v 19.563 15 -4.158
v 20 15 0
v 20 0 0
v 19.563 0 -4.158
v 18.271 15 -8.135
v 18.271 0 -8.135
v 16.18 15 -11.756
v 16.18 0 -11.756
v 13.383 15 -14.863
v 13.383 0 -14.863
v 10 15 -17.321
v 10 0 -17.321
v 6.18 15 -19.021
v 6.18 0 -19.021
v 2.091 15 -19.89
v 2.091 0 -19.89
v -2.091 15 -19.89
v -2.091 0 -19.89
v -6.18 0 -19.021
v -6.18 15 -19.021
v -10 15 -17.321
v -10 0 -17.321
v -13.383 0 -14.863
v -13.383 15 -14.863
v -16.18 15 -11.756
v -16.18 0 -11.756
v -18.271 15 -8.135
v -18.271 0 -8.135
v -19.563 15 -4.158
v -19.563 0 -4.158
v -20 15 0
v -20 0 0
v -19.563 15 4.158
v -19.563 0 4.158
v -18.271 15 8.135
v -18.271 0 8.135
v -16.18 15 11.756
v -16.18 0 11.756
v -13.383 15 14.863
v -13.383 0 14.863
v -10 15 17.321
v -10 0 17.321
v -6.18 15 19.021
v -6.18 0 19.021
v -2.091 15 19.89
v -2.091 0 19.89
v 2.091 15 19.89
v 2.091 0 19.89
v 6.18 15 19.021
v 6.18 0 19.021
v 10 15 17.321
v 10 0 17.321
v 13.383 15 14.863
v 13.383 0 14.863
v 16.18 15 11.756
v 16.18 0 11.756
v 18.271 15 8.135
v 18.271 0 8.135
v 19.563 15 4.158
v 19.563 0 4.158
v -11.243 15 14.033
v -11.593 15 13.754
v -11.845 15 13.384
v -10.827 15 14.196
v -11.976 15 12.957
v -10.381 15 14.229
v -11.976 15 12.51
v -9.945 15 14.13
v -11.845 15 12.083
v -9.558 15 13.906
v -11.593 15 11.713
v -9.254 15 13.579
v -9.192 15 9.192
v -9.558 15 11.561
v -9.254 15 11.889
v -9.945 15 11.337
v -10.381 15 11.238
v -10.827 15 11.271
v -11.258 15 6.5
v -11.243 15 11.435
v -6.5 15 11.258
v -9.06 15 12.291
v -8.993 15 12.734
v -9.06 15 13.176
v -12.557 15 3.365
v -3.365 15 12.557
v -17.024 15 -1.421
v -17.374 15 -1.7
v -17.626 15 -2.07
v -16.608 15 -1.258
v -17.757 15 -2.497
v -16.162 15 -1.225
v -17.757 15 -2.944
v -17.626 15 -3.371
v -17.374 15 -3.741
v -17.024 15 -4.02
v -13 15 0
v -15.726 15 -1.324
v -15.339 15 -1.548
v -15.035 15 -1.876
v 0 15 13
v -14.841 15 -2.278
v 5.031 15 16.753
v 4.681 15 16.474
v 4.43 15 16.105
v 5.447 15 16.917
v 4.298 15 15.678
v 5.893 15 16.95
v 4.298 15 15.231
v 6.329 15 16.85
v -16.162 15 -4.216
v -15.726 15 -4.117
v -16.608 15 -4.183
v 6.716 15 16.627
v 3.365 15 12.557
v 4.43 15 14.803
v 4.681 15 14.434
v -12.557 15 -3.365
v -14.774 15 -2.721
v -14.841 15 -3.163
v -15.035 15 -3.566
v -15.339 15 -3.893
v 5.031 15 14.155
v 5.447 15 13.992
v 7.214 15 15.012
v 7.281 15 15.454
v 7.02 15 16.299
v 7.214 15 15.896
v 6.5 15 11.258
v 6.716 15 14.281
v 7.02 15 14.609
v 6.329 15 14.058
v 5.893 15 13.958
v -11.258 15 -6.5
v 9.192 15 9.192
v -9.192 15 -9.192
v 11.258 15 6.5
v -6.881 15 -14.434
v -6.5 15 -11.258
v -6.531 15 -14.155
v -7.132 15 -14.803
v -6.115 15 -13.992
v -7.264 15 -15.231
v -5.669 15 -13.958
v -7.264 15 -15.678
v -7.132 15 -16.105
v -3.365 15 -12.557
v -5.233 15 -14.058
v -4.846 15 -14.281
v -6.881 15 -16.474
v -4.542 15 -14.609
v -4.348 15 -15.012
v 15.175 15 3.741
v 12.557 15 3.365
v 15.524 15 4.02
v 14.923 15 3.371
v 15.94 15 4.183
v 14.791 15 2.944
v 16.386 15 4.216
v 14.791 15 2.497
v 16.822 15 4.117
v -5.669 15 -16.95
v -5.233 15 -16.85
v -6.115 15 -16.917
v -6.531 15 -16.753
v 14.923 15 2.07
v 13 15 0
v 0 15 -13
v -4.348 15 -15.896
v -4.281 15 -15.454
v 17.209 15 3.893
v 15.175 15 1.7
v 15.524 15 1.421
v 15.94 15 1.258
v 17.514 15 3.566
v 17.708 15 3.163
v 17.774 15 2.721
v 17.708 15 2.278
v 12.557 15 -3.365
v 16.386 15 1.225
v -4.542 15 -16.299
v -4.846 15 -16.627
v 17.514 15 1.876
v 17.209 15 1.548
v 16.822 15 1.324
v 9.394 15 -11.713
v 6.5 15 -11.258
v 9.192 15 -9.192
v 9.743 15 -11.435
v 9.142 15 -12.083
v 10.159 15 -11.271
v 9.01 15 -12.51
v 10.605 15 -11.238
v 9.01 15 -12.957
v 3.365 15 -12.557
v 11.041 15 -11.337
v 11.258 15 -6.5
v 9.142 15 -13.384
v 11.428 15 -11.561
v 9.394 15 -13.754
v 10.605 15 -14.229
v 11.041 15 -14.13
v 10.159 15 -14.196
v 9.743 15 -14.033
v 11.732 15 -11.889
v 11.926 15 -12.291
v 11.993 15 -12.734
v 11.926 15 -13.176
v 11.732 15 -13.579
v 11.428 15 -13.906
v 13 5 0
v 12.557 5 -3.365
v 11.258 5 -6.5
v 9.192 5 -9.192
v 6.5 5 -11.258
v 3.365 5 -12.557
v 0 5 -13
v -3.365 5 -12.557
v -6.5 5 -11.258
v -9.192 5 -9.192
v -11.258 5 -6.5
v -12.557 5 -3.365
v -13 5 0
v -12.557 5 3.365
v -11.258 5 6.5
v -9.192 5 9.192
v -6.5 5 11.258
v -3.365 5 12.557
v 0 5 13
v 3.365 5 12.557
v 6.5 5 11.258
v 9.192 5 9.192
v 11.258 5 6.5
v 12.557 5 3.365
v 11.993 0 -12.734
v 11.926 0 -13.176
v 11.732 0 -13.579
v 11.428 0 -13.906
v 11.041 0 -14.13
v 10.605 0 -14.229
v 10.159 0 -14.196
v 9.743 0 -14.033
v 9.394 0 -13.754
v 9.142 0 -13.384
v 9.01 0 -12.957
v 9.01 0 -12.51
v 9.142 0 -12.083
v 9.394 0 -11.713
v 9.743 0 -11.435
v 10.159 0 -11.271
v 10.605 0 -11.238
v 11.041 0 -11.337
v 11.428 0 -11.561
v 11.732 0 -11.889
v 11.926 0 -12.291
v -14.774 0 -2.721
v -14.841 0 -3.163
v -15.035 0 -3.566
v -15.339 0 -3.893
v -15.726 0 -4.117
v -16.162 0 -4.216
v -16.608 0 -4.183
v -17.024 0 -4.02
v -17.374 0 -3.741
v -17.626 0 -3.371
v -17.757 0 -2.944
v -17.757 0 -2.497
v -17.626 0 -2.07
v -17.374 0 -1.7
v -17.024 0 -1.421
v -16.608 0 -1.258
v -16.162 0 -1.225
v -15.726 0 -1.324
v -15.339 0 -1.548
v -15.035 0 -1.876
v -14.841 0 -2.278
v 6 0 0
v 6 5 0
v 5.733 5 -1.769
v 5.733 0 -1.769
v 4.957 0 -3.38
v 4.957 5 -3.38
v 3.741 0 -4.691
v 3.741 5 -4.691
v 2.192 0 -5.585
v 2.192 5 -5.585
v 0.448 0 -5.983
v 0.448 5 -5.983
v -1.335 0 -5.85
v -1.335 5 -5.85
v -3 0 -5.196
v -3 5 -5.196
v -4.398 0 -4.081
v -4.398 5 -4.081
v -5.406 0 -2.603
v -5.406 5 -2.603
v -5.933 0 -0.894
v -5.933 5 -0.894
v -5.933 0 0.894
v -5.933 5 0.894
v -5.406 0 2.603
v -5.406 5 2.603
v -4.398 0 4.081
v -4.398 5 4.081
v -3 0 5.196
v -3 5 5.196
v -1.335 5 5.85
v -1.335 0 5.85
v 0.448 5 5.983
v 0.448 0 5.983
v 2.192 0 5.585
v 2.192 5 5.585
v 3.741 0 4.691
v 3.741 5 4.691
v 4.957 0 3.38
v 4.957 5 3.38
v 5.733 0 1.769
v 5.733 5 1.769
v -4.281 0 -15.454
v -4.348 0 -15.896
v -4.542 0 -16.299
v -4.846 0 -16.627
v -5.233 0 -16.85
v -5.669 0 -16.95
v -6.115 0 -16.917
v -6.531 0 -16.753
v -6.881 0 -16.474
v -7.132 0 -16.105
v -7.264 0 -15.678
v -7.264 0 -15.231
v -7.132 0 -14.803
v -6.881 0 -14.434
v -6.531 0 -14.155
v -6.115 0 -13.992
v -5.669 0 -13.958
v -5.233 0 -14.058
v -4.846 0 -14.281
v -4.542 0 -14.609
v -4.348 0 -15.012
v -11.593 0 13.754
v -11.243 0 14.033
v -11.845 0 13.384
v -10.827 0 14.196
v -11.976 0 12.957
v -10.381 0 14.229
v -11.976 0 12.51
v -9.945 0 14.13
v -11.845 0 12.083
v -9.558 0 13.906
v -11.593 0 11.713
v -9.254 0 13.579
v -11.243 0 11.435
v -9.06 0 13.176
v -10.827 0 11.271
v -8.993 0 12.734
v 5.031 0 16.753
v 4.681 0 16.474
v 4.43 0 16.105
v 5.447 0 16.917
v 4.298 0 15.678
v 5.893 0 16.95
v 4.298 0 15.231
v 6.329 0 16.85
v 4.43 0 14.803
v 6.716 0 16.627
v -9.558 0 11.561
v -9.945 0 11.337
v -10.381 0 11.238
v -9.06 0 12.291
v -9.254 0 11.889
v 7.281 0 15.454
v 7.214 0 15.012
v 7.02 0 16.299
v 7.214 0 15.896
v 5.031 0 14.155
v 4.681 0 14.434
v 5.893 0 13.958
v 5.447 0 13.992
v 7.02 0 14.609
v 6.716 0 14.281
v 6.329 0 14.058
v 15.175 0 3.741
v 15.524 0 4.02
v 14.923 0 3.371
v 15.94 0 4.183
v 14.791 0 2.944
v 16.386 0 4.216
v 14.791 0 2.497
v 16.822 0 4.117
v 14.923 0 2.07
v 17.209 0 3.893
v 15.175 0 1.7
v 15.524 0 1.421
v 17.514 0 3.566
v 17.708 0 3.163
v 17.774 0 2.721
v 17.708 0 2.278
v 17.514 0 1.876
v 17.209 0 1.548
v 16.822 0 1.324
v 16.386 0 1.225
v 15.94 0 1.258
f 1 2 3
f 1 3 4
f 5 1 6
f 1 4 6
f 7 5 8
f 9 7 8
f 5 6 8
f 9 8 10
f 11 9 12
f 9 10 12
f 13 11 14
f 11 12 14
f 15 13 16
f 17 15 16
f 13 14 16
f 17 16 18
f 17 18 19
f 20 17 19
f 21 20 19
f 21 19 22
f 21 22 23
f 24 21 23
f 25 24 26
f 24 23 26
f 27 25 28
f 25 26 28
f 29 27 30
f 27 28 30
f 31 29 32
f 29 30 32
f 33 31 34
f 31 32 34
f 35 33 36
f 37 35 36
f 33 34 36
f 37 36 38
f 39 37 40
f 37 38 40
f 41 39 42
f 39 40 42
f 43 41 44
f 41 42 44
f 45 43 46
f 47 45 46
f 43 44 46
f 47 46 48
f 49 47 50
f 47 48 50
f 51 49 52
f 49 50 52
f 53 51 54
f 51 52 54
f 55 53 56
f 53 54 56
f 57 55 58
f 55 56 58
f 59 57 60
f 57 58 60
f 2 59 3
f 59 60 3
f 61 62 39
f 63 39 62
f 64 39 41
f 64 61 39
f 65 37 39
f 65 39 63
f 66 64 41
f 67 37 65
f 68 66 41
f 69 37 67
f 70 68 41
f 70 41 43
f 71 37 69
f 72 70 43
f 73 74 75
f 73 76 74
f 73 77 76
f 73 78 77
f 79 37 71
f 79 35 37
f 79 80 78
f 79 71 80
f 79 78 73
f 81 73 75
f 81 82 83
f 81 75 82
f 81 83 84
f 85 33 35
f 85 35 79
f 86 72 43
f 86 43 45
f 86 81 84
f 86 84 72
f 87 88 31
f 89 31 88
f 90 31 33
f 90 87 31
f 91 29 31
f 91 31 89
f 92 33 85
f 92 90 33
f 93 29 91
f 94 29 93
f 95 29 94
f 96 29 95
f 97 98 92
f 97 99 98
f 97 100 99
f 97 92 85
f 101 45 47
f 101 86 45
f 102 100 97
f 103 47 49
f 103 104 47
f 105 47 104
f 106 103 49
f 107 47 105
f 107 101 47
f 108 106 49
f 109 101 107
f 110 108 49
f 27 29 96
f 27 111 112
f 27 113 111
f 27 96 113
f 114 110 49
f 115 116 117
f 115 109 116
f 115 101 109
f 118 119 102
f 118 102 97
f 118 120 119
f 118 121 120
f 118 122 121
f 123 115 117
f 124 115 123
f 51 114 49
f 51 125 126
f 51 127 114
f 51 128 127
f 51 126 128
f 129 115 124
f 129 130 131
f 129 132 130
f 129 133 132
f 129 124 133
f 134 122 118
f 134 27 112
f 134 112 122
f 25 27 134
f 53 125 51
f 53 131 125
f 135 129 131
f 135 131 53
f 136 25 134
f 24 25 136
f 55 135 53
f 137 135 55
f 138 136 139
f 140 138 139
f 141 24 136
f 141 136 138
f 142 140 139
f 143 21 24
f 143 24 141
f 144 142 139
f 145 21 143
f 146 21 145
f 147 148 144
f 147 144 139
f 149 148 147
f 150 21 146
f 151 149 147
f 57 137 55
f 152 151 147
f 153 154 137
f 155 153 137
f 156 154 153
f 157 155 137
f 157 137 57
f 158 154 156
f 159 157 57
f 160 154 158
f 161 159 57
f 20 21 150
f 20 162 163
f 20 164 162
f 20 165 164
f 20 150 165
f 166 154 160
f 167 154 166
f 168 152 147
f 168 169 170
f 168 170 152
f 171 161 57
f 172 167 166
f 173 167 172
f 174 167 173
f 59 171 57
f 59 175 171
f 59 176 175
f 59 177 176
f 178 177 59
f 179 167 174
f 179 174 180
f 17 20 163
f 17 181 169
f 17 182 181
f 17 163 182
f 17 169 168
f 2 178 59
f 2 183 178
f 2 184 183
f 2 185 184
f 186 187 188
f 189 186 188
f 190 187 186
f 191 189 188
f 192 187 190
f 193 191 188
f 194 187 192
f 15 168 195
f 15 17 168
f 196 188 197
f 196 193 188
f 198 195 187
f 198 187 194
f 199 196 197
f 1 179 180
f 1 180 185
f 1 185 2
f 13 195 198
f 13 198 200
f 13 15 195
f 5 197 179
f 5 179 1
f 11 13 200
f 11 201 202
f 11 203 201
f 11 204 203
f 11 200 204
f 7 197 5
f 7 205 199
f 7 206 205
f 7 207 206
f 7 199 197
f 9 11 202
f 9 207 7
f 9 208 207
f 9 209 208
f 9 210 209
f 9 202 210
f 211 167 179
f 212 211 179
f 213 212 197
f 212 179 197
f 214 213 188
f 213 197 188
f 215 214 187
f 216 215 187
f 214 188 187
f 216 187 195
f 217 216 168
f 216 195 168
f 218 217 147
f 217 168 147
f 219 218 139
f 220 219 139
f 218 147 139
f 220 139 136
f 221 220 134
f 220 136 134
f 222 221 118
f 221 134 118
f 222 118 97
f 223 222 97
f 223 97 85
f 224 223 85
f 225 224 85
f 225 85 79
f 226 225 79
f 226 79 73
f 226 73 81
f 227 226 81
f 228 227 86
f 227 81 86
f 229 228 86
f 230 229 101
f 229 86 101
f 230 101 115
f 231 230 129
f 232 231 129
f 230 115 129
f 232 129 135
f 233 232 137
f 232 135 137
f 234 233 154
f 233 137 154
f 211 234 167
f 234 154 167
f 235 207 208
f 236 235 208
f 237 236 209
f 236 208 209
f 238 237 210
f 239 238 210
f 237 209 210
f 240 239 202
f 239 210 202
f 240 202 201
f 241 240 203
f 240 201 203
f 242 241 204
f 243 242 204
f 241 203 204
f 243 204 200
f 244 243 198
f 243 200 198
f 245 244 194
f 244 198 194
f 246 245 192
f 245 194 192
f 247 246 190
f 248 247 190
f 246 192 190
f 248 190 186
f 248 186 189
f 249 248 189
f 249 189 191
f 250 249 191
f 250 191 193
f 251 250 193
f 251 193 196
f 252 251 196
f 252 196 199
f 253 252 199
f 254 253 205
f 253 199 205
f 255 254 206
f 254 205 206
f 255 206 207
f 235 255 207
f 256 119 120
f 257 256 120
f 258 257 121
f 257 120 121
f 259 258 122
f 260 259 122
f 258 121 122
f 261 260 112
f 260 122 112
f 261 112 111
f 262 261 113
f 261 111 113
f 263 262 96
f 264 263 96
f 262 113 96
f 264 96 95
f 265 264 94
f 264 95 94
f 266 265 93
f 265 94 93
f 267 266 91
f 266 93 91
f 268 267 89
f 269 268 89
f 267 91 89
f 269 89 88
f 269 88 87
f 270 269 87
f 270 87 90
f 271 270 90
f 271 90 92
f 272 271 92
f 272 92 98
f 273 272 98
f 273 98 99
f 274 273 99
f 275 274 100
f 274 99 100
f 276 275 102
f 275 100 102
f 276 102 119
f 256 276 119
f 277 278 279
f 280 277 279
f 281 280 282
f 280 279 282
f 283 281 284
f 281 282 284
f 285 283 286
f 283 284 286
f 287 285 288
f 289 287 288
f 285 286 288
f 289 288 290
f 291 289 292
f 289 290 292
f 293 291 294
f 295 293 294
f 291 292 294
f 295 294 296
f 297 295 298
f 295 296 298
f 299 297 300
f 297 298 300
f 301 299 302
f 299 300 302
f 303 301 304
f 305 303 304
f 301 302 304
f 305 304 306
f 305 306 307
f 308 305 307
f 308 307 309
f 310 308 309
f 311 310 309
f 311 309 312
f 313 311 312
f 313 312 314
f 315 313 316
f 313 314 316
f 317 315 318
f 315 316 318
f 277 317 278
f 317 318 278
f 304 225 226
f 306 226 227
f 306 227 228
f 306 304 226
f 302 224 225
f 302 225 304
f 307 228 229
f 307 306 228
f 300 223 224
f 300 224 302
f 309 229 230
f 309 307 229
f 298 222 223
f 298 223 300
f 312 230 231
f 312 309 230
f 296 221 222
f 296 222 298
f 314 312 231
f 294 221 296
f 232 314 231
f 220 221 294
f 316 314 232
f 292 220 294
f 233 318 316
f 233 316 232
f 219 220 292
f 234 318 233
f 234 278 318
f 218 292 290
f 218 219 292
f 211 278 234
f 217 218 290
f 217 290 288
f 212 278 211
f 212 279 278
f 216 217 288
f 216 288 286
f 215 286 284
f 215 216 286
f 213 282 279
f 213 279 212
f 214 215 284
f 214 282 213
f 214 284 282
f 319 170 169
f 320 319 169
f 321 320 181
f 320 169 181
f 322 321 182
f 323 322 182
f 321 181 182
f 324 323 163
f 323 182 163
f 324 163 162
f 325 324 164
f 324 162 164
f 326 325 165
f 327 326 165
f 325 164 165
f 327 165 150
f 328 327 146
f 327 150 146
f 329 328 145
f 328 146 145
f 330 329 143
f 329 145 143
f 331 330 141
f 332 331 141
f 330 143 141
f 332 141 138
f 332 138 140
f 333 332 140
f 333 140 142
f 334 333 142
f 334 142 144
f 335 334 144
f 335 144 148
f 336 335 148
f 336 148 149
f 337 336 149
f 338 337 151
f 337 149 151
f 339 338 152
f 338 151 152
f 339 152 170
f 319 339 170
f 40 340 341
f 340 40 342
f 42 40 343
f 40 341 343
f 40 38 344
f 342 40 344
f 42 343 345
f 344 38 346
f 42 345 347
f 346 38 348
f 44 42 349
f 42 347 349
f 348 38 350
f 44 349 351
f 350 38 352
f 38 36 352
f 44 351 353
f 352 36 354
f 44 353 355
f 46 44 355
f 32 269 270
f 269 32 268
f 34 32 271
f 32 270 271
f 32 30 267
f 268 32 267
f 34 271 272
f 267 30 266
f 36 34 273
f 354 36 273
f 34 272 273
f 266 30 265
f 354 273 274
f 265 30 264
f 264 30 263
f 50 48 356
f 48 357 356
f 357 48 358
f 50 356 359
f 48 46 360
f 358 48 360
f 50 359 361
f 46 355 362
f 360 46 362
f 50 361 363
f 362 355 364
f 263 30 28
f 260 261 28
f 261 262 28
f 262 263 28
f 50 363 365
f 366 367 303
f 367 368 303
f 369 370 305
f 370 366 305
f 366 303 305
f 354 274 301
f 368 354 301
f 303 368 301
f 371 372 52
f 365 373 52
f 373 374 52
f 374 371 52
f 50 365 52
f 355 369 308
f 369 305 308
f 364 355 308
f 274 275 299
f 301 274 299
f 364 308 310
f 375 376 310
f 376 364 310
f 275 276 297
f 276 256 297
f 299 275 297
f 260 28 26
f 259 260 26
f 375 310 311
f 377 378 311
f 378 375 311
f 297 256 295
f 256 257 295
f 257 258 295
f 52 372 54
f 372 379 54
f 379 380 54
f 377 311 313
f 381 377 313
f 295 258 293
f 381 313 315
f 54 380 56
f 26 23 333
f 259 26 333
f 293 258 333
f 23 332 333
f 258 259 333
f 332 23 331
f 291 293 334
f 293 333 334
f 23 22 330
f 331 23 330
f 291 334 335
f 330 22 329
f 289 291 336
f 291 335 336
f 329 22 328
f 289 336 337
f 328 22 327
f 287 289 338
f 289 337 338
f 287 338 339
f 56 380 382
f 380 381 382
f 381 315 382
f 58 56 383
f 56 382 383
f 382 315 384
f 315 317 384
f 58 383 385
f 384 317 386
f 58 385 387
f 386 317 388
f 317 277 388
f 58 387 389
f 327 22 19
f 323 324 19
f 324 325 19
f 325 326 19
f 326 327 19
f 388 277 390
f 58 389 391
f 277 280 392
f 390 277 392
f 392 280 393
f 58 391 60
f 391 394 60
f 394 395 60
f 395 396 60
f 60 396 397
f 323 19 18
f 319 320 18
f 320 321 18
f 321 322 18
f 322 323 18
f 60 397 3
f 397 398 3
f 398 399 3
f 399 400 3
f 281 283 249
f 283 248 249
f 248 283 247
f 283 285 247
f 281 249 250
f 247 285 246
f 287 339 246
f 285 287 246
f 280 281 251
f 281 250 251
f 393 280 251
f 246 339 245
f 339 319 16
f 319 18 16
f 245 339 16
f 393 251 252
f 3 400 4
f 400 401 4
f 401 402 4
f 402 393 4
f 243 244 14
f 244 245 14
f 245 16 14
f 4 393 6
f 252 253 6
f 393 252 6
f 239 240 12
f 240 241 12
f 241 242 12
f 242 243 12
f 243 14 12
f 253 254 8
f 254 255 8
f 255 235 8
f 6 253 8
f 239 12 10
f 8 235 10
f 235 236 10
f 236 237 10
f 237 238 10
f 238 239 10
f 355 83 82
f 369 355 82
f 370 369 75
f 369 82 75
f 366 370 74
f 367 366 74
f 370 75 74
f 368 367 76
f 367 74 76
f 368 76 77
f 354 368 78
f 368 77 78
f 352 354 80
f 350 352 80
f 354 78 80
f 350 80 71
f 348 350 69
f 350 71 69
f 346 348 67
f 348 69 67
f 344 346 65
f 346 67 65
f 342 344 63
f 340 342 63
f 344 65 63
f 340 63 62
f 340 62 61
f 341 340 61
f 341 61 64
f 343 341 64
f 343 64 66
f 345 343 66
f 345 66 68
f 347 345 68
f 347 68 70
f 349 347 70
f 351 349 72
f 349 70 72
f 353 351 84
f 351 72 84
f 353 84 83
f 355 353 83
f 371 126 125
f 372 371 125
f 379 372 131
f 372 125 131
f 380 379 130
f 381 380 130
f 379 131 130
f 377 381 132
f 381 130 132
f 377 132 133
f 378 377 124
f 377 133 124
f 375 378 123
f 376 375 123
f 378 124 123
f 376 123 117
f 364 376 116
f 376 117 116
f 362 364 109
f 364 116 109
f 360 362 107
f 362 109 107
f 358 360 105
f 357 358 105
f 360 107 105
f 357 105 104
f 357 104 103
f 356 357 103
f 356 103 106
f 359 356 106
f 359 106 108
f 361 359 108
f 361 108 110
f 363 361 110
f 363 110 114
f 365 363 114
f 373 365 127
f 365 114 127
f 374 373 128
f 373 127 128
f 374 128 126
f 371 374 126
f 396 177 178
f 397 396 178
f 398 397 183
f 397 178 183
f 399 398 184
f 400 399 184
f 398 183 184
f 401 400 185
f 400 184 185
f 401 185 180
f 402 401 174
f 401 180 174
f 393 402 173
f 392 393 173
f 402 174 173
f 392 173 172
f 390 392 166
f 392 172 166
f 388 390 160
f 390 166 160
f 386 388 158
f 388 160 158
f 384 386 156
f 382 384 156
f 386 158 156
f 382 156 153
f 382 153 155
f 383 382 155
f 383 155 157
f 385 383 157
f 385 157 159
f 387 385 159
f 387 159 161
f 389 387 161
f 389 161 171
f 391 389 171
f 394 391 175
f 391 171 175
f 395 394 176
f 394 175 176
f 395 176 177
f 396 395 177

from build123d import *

# Parameters (mm, degrees)
SKETCH1_R           = 20
BOSS_EXTRUDE1_DEPTH = 15
SKETCH2_R           = 13
CUT_EXTRUDE1_DEPTH  = 10
SKETCH3_R           = 6
CUT_EXTRUDE2_DEPTH  = 5
SKETCH4_R           = 1.5
CUT_EXTRUDE3_DEPTH  = 15


with BuildPart() as part:
    # Sketch1 → Boss-Extrude1 (new body)
    with BuildSketch(Plane(origin=(0, 0, 0), x_dir=(1, 0, 0), z_dir=(0, 1, 0))):
        Circle(SKETCH1_R)
    extrude(amount=BOSS_EXTRUDE1_DEPTH)

    # Sketch2 → Cut-Extrude1 (cut)
    with BuildSketch(Plane(origin=(0, 15, 0), x_dir=(1, 0, 0), z_dir=(0, 1, 0))):
        Circle(SKETCH2_R)
    extrude(amount=-CUT_EXTRUDE1_DEPTH, mode=Mode.SUBTRACT)

    # Sketch3 → Cut-Extrude2 (cut)
    with BuildSketch(Plane(origin=(0, 5, 0), x_dir=(1, 0, 0), z_dir=(0, 1, 0))):
        Circle(SKETCH3_R)
    extrude(amount=-CUT_EXTRUDE2_DEPTH, mode=Mode.SUBTRACT)

    # Sketch4 → Cut-Extrude3 (cut)
    with BuildSketch(Plane(origin=(0, 15, 0), x_dir=(1, 0, 0), z_dir=(0, 1, 0))):
        with Locations((-10.493132047, -12.733584721)):
            Circle(SKETCH4_R)
        with Locations((-16.274173873, 2.720526557)):
            Circle(SKETCH4_R)
        with Locations((-5.781041827, 15.454111278)):
            Circle(SKETCH4_R)
        with Locations((10.493132047, 12.733584721)):
            Circle(SKETCH4_R)
        with Locations((16.274173873, -2.720526557)):
            Circle(SKETCH4_R)
        with Locations((5.781041827, -15.454111278)):
            Circle(SKETCH4_R)
    extrude(amount=-CUT_EXTRUDE3_DEPTH, mode=Mode.SUBTRACT)


solid = part.part
